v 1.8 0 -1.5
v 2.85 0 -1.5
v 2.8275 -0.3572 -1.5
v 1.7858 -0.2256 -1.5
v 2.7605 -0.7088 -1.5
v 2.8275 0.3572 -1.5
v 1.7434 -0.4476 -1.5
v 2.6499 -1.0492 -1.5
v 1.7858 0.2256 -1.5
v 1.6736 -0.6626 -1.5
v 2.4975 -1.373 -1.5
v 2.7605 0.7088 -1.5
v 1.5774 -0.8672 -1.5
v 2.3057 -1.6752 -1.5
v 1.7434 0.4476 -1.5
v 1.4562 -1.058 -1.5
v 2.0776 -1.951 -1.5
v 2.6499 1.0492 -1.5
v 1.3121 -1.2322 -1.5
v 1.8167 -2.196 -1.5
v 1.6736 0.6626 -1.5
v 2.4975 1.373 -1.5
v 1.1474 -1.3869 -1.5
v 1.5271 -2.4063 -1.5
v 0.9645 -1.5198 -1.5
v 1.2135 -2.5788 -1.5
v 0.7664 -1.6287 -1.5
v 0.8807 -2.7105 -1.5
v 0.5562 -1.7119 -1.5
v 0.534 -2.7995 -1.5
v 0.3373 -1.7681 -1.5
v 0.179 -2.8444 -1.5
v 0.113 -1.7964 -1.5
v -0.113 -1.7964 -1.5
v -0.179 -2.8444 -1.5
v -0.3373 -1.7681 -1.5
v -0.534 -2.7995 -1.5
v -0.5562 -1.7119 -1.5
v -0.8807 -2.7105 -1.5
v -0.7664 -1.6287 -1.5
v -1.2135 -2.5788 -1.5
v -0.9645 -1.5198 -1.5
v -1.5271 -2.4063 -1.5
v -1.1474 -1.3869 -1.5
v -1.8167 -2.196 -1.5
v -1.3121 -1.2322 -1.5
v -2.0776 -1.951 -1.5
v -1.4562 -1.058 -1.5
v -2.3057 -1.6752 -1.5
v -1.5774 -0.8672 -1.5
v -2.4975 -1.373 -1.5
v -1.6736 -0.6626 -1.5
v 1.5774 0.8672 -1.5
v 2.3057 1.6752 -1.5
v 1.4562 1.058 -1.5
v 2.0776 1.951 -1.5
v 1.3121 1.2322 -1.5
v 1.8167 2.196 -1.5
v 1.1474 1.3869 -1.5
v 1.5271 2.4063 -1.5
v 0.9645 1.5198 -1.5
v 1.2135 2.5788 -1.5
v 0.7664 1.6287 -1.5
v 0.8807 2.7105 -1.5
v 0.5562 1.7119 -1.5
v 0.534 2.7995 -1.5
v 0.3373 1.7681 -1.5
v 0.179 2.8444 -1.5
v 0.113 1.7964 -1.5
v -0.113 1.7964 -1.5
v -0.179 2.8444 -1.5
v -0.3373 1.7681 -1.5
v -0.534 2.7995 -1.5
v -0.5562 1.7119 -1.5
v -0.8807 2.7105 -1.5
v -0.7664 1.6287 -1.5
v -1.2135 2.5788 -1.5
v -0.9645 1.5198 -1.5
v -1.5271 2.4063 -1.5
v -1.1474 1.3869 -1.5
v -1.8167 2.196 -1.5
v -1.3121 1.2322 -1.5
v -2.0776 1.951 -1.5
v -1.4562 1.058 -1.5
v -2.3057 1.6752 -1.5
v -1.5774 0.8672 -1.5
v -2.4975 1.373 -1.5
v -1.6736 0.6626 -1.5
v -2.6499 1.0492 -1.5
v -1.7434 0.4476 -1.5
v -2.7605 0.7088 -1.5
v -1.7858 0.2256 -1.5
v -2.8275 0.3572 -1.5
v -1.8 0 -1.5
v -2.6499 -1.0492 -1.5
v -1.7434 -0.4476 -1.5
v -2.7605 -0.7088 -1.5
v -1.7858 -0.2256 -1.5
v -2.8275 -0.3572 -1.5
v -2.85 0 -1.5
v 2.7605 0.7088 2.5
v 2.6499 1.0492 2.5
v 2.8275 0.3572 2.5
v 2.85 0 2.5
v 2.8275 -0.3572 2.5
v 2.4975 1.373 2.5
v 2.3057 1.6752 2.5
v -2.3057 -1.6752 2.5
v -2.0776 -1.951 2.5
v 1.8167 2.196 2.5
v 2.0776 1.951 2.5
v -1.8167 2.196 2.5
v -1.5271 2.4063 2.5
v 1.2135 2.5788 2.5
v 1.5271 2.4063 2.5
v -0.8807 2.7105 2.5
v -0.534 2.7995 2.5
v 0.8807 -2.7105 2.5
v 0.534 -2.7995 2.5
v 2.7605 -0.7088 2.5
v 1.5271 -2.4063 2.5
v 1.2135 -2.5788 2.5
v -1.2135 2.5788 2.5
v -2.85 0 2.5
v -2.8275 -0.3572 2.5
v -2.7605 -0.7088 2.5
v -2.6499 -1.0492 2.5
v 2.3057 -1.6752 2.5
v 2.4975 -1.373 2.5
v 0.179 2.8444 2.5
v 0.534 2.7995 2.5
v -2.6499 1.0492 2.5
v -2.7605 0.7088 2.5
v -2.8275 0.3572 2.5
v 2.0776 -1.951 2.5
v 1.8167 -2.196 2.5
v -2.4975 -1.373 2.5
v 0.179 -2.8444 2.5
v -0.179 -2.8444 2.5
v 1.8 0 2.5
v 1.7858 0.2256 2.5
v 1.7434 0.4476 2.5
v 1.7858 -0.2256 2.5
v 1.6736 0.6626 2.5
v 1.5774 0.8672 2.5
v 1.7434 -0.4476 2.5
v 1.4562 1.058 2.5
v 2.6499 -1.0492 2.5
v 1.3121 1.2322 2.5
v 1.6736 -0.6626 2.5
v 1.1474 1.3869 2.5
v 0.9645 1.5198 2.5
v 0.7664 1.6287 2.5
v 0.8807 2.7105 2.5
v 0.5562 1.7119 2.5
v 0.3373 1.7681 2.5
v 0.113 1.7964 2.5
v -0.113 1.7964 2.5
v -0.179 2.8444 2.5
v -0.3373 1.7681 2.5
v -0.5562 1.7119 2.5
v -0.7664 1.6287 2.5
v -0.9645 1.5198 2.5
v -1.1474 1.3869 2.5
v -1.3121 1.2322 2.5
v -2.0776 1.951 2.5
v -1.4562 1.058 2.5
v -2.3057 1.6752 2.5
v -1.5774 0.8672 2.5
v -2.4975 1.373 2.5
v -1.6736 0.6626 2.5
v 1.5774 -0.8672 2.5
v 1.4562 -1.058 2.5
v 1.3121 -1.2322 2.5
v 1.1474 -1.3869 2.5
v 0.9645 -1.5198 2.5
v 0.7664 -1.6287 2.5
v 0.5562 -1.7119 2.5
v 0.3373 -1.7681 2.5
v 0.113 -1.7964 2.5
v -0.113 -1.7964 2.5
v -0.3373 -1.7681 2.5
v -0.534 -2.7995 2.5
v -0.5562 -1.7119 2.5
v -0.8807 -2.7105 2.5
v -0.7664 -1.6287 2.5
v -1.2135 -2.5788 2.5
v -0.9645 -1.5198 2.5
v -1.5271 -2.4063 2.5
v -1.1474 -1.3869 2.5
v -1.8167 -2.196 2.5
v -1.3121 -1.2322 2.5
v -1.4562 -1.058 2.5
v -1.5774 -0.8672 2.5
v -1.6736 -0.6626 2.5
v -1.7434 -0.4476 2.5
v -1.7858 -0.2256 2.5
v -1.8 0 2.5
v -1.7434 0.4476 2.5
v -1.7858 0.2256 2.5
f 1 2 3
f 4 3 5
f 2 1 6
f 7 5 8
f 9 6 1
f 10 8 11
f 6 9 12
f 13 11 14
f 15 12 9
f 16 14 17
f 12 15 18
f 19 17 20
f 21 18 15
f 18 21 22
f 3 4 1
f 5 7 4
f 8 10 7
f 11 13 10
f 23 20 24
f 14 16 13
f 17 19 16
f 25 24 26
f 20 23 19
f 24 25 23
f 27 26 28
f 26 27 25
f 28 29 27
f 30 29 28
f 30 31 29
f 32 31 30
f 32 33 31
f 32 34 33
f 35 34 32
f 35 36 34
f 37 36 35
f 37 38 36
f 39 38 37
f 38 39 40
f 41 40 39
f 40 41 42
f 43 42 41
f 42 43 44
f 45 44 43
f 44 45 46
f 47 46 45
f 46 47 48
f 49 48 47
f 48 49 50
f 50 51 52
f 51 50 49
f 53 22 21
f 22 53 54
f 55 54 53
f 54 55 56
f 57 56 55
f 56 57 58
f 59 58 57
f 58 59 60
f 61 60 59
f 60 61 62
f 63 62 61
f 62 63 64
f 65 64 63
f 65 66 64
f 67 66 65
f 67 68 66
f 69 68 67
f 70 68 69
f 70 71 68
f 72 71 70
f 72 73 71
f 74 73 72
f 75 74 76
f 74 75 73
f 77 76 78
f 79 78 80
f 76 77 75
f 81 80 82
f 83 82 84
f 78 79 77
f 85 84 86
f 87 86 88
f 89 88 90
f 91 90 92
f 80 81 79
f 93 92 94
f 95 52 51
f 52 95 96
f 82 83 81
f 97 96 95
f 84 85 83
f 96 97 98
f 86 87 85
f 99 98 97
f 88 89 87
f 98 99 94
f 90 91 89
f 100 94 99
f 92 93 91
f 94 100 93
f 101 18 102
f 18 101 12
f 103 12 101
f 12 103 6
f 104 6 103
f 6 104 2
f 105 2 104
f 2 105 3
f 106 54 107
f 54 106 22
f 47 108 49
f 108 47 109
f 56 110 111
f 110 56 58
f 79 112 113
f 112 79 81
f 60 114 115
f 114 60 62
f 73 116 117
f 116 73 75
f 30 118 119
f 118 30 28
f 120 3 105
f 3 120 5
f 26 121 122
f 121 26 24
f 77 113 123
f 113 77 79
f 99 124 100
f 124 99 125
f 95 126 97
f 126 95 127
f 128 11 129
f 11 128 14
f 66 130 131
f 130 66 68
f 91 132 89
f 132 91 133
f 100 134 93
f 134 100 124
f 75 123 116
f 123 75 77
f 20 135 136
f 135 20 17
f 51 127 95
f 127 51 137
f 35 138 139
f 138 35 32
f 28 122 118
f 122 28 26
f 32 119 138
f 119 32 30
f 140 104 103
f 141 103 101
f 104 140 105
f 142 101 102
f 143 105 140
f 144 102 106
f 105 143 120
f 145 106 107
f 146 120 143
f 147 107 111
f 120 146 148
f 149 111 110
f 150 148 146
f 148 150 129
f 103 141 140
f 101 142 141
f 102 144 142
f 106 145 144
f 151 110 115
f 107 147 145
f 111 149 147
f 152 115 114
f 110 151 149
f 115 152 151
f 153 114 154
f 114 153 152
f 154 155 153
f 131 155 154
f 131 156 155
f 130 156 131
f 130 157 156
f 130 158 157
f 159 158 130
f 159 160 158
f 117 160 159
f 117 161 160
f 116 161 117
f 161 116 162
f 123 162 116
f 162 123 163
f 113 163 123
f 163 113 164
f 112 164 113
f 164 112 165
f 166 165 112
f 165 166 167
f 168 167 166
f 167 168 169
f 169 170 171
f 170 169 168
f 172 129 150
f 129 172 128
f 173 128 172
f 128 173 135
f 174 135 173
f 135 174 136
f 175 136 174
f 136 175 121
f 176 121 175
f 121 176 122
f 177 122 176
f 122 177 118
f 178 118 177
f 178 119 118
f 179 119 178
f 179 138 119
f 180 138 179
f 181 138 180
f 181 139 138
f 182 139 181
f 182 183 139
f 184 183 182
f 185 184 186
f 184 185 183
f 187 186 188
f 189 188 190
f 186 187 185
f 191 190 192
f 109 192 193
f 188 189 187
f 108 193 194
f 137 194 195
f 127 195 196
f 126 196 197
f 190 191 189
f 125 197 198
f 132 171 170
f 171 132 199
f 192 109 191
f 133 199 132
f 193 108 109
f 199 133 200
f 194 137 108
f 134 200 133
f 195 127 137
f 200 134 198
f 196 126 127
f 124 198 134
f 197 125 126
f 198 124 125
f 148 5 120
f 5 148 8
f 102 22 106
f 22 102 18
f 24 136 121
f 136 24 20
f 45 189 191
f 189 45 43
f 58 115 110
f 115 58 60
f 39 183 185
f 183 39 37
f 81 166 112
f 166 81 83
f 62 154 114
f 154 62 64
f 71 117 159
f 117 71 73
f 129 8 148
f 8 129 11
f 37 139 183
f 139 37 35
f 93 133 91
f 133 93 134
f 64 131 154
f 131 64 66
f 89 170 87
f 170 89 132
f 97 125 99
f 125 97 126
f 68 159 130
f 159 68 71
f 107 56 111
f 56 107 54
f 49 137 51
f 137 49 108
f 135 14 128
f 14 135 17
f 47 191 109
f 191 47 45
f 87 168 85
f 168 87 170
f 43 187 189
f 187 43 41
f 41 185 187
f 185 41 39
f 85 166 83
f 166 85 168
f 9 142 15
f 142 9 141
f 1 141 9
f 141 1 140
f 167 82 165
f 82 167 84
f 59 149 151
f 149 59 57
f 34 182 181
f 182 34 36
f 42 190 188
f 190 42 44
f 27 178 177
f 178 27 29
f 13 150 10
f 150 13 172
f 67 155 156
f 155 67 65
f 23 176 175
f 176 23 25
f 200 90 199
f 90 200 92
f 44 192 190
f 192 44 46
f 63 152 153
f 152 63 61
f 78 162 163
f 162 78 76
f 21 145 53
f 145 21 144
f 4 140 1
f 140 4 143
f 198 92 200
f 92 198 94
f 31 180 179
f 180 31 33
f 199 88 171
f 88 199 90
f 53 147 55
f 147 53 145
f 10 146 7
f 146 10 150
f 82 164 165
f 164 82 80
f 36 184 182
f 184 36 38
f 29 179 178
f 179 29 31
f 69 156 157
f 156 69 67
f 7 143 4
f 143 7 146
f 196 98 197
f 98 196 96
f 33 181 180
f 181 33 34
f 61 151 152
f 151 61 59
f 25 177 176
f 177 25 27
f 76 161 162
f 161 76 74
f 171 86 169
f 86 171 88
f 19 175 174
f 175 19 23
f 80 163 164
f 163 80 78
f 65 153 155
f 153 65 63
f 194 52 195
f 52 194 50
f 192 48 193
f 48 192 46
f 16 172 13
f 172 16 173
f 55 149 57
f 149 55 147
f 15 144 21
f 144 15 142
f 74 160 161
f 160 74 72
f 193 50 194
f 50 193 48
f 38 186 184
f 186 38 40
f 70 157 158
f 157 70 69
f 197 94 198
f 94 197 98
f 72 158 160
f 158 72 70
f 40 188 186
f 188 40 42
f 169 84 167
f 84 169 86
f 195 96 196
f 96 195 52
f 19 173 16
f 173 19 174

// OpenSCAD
$fn = 50;


difference() {
	union() {
		translate(v = [0, 0, -1.5000000000]) {
			cylinder(h = 3, r = 1.0000000000);
		}
		translate(v = [0, 0, -1.5000000000]) {
			cylinder(h = 4, r = 2.8500000000);
		}
	}
	union() {
		translate(v = [0, 0, -100.0000000000]) {
			cylinder(h = 200, r = 1.8000000000);
		}
	}
}
